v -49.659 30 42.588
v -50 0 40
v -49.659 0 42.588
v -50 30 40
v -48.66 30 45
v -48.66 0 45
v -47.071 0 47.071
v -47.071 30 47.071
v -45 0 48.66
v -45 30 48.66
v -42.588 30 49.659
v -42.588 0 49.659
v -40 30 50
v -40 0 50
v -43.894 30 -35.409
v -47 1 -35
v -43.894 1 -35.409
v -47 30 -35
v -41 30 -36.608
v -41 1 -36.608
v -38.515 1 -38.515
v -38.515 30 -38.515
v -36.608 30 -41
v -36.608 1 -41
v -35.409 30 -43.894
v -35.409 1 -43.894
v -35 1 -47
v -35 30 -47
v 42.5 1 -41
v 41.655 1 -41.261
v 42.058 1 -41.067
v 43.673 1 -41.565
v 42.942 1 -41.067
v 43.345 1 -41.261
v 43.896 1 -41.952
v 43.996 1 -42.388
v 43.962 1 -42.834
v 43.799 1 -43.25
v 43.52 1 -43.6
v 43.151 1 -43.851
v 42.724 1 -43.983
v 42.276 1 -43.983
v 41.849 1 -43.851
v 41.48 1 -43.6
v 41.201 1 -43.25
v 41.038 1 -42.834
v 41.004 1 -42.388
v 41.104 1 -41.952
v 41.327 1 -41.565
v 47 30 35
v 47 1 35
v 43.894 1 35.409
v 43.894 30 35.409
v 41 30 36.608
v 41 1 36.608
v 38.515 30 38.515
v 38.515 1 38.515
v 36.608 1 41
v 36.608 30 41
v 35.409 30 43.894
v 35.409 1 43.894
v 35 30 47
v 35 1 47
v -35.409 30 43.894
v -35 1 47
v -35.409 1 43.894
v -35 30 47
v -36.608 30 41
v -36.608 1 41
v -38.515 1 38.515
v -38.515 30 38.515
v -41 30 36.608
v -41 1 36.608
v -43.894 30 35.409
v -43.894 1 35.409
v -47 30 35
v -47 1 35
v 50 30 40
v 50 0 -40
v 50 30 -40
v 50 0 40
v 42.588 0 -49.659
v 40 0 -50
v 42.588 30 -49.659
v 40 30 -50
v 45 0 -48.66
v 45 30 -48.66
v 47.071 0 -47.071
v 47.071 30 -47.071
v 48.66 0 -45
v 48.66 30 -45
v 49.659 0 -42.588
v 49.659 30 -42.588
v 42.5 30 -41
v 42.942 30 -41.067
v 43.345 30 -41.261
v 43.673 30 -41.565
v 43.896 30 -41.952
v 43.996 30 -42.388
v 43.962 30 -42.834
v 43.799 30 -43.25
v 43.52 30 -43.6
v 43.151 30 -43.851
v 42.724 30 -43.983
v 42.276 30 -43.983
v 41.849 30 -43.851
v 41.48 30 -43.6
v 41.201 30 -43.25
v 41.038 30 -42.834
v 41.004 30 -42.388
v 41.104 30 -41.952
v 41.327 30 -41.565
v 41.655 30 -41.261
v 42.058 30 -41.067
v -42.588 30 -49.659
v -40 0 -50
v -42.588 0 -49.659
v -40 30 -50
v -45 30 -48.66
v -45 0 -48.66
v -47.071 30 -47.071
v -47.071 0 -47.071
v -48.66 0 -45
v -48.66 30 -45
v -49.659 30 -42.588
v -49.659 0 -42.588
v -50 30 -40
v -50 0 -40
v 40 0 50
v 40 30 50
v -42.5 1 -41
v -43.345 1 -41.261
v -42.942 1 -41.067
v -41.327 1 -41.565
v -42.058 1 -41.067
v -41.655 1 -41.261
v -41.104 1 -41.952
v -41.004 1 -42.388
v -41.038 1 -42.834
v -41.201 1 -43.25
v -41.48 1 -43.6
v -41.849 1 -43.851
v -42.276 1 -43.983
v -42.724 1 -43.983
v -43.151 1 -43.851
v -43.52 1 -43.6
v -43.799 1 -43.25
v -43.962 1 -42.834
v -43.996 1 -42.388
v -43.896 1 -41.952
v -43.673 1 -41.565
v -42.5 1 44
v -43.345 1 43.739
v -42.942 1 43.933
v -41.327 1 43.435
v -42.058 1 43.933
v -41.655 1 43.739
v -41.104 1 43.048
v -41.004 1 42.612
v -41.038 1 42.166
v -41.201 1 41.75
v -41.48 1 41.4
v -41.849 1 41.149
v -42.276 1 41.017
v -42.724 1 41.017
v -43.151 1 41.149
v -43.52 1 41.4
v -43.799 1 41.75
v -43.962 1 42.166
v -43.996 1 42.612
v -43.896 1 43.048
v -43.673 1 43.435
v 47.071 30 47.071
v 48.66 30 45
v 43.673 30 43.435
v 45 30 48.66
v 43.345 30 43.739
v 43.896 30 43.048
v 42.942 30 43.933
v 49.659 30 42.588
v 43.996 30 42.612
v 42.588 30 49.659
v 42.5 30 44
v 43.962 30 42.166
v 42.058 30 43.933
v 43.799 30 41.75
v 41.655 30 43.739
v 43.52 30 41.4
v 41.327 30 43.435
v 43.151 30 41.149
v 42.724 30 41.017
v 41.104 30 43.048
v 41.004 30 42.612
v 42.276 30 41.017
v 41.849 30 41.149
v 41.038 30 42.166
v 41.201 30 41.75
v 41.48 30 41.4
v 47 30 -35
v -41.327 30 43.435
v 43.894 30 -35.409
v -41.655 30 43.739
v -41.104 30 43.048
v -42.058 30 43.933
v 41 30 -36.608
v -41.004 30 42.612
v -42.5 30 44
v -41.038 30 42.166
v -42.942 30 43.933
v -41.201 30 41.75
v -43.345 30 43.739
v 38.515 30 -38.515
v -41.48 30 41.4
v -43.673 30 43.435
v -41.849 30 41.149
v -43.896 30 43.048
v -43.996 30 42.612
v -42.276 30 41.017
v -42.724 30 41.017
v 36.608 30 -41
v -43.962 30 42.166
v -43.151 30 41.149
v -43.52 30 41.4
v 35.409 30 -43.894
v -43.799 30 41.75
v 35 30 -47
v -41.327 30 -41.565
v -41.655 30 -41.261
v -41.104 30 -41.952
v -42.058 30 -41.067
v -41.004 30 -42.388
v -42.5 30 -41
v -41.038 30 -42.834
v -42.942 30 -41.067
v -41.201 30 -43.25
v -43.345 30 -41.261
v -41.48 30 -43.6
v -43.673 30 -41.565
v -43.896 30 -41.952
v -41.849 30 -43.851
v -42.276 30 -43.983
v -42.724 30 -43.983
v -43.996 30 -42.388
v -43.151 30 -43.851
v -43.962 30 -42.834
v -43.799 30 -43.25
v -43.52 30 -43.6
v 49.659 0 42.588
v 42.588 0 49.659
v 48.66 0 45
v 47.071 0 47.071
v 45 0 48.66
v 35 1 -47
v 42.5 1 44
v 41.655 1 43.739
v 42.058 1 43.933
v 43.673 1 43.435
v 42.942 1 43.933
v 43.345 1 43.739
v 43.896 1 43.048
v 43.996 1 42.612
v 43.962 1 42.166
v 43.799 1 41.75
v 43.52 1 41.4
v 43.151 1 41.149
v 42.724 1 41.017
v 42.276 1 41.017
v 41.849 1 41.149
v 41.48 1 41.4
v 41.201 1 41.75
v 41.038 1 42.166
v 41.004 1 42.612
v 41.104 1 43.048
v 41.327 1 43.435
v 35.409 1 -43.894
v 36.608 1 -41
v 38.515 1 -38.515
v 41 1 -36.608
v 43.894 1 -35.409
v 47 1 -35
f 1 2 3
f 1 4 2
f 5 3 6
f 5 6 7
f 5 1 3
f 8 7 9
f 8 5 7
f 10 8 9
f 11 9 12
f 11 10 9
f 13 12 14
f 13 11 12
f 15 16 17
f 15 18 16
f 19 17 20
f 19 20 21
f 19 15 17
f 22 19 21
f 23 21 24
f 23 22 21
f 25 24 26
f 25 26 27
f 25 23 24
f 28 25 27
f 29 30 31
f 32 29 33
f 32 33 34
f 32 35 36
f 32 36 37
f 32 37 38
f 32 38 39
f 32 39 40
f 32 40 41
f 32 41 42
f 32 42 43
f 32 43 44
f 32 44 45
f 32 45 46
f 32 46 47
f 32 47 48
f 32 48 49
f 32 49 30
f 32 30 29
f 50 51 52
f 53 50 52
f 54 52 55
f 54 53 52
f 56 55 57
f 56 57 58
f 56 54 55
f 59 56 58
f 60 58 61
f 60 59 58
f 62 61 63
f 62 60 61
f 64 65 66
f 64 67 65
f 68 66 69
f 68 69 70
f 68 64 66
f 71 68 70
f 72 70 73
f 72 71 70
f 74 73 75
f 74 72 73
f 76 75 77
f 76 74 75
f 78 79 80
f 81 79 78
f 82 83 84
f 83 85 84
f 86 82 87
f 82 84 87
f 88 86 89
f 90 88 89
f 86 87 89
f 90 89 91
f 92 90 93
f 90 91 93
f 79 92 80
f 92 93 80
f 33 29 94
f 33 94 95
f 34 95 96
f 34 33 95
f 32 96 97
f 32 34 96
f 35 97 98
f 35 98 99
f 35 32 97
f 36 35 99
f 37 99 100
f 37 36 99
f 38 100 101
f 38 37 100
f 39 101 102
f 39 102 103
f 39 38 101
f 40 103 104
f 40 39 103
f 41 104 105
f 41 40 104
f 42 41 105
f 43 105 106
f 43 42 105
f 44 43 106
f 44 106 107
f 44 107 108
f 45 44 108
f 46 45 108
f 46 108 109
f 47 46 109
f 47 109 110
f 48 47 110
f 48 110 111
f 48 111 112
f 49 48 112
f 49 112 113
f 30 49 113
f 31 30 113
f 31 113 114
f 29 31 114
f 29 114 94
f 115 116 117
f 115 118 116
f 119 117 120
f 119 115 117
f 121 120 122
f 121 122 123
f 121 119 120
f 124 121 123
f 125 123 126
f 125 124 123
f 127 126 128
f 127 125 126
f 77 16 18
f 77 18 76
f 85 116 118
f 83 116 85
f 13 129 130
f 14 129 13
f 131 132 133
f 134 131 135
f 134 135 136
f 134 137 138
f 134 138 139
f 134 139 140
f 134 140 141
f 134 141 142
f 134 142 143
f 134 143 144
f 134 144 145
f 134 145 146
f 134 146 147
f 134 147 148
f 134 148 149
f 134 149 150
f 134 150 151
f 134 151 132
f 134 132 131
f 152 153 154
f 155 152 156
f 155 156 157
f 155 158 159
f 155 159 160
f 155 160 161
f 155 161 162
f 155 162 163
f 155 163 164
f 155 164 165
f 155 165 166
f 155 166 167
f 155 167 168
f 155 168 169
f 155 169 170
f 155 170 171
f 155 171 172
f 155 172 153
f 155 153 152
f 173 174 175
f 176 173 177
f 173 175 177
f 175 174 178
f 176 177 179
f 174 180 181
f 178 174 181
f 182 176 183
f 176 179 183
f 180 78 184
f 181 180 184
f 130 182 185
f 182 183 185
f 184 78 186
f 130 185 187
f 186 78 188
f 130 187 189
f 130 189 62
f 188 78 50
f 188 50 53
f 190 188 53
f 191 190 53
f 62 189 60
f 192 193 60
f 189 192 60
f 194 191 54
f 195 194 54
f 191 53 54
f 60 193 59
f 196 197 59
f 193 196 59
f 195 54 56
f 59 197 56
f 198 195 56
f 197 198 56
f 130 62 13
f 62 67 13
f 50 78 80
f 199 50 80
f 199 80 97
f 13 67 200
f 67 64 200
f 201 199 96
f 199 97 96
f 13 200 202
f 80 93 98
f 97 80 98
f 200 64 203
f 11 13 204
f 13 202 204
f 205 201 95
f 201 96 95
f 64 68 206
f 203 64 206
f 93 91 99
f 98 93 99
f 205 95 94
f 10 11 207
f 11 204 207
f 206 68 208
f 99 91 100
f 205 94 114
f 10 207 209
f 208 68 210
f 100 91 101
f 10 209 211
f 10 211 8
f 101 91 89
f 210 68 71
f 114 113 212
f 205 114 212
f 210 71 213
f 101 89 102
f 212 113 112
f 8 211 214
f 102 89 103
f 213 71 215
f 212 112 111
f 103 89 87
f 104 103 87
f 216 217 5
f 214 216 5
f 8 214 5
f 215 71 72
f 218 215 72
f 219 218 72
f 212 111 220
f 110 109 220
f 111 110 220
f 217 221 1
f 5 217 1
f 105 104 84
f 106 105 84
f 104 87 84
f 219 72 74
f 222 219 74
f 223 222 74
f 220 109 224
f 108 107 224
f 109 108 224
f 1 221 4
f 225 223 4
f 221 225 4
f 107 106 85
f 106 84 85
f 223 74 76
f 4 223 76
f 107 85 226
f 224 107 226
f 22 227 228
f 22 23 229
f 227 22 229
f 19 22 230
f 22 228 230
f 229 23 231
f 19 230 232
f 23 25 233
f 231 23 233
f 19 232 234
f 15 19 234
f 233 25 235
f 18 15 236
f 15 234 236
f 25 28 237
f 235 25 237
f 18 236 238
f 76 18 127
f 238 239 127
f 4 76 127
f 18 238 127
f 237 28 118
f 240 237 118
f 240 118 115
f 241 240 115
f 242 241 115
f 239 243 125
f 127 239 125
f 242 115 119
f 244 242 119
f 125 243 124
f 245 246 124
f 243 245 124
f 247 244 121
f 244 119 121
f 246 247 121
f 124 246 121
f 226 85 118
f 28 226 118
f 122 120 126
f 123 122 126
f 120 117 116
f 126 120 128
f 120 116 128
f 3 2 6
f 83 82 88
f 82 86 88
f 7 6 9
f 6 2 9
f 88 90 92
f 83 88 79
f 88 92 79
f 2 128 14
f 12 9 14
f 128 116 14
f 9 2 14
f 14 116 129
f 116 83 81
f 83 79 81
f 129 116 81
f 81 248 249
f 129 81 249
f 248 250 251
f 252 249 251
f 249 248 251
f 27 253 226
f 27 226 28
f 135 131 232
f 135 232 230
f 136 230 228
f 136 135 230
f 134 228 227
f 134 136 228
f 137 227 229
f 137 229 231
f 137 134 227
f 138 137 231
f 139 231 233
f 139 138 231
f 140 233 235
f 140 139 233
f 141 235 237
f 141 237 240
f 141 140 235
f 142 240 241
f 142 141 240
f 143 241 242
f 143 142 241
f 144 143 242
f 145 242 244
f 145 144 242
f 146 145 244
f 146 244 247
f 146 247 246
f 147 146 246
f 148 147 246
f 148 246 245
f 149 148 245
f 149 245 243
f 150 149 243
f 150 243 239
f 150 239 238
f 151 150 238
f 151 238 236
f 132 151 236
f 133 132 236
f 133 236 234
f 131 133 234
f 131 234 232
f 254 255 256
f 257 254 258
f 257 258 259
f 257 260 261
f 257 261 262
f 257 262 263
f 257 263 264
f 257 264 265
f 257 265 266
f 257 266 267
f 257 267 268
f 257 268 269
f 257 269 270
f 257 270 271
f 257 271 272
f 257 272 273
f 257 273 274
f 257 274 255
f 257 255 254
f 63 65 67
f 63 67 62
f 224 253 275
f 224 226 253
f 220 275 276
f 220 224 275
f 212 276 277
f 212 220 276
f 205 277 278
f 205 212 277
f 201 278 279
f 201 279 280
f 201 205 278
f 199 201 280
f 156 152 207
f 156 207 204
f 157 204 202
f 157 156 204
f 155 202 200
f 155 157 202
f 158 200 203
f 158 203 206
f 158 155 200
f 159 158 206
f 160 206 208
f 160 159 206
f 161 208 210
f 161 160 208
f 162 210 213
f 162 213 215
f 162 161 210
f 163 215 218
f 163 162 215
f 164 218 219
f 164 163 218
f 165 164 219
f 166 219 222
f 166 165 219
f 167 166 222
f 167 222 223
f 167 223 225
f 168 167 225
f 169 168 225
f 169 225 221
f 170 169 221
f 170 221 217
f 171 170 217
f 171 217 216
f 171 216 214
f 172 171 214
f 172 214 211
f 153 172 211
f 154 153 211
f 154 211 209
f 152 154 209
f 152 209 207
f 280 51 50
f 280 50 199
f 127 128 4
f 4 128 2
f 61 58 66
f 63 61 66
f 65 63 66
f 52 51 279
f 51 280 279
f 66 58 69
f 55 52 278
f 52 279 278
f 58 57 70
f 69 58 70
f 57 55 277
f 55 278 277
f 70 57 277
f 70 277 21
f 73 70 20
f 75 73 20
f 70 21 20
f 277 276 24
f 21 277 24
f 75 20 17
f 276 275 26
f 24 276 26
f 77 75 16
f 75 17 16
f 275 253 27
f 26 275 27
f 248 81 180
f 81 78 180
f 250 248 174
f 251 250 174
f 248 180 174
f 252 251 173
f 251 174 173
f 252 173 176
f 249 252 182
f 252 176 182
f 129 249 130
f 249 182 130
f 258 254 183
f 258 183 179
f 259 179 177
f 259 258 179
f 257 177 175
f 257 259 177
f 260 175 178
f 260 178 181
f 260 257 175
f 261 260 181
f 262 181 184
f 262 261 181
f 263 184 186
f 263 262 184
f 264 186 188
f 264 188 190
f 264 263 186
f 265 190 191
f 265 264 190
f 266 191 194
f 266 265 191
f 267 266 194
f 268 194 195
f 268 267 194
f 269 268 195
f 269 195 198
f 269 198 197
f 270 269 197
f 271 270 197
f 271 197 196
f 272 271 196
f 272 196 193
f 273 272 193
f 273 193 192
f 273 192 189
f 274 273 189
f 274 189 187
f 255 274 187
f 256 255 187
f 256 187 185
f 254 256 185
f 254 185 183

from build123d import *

# Parameters (mm, degrees)
SKIZZE1_R                       = 1.5
AUFSATZ_LINEAR_AUSTRAGEN1_DEPTH = 30
AUFSATZ_LINEAR_AUSTRAGEN2_DEPTH = 1
VERRUNDUNG1_R                   = 10
SKIZZE1_4_R                     = 1.5
AUFSATZ_LINEAR_AUSTRAGEN3_DEPTH = 1
VERRUNDUNG2_R                   = 12


with BuildPart() as part:
    # Skizze1 → Aufsatz-Linear austragen1 (new body)
    with BuildSketch(Plane(origin=(0, 0, 0), x_dir=(1, 0, 0), z_dir=(0, 1, 0))):
        Polygon((-50, 50), (50, 50), (50, -50), (-50, -50), (-50, 35), align=None)
        with Locations(Location((42.5, 42.5, 0), (0, 0, 270))):
            Circle(SKIZZE1_R, mode=Mode.SUBTRACT)
        with Locations(Location((-42.5, 42.5, 0), (0, 0, 270))):
            Circle(SKIZZE1_R, mode=Mode.SUBTRACT)
        with Locations(Location((42.5, -42.5, 0), (0, 0, 270))):
            Circle(SKIZZE1_R, mode=Mode.SUBTRACT)
        with Locations(Location((-42.5, -42.5, 0), (0, 0, 270))):
            Circle(SKIZZE1_R, mode=Mode.SUBTRACT)
        Polygon((-47, -35), (-35, -35), (-35, -47), (35, -47), (35, -35), (47, -35), (47, 35), (35, 35), (35, 47), (-35, 47), (-35, 35), (-47, 35), align=None, mode=Mode.SUBTRACT)
    extrude(amount=AUFSATZ_LINEAR_AUSTRAGEN1_DEPTH)

    # Skizze1<3> → Aufsatz-Linear austragen2 (add)
    with BuildSketch(Plane(origin=(0, 0, 0), x_dir=(1, 0, 0), z_dir=(0, 1, 0))):
        Polygon((-47, -35), (-47, 35), (-35, 35), (-35, 47), (35, 47), (35, 35), (47, 35), (47, -35), (35, -35), (35, -47), (-35, -47), (-35, -35), align=None)
    extrude(amount=AUFSATZ_LINEAR_AUSTRAGEN2_DEPTH)

    # Verrundung1
    verrundung1_edges = [part.edges().sort_by_distance(p)[0] for p in [
        (50, 15, -50),
        (50, 15, 50),
        (-50, 15, 50),
        (-50, 15, -50),
    ]]
    fillet(verrundung1_edges, radius=VERRUNDUNG1_R)

    # Skizze1<4> → Aufsatz-Linear austragen3 (add)
    with BuildSketch(Plane(origin=(0, 0, 0), x_dir=(1, 0, 0), z_dir=(0, 1, 0))):
        with Locations(Location((-42.5, 42.5, 0), (0, 0, 270))):
            Circle(SKIZZE1_4_R)
        with Locations(Location((-42.5, -42.5, 0), (0, 0, 270))):
            Circle(SKIZZE1_4_R)
        with Locations(Location((42.5, -42.5, 0), (0, 0, 270))):
            Circle(SKIZZE1_4_R)
        with Locations(Location((42.5, 42.5, 0), (0, 0, 270))):
            Circle(SKIZZE1_4_R)
    extrude(amount=AUFSATZ_LINEAR_AUSTRAGEN3_DEPTH)

    # Verrundung2
    verrundung2_edges = [part.edges().sort_by_distance(p)[0] for p in [
        (35, 15.5, 35),
        (-35, 15.5, 35),
        (35, 15.5, -35),
        (-35, 15.5, -35),
    ]]
    fillet(verrundung2_edges, radius=VERRUNDUNG2_R - 0.0001)  # a hair under: the kernel refuses the full size


solid = part.part
